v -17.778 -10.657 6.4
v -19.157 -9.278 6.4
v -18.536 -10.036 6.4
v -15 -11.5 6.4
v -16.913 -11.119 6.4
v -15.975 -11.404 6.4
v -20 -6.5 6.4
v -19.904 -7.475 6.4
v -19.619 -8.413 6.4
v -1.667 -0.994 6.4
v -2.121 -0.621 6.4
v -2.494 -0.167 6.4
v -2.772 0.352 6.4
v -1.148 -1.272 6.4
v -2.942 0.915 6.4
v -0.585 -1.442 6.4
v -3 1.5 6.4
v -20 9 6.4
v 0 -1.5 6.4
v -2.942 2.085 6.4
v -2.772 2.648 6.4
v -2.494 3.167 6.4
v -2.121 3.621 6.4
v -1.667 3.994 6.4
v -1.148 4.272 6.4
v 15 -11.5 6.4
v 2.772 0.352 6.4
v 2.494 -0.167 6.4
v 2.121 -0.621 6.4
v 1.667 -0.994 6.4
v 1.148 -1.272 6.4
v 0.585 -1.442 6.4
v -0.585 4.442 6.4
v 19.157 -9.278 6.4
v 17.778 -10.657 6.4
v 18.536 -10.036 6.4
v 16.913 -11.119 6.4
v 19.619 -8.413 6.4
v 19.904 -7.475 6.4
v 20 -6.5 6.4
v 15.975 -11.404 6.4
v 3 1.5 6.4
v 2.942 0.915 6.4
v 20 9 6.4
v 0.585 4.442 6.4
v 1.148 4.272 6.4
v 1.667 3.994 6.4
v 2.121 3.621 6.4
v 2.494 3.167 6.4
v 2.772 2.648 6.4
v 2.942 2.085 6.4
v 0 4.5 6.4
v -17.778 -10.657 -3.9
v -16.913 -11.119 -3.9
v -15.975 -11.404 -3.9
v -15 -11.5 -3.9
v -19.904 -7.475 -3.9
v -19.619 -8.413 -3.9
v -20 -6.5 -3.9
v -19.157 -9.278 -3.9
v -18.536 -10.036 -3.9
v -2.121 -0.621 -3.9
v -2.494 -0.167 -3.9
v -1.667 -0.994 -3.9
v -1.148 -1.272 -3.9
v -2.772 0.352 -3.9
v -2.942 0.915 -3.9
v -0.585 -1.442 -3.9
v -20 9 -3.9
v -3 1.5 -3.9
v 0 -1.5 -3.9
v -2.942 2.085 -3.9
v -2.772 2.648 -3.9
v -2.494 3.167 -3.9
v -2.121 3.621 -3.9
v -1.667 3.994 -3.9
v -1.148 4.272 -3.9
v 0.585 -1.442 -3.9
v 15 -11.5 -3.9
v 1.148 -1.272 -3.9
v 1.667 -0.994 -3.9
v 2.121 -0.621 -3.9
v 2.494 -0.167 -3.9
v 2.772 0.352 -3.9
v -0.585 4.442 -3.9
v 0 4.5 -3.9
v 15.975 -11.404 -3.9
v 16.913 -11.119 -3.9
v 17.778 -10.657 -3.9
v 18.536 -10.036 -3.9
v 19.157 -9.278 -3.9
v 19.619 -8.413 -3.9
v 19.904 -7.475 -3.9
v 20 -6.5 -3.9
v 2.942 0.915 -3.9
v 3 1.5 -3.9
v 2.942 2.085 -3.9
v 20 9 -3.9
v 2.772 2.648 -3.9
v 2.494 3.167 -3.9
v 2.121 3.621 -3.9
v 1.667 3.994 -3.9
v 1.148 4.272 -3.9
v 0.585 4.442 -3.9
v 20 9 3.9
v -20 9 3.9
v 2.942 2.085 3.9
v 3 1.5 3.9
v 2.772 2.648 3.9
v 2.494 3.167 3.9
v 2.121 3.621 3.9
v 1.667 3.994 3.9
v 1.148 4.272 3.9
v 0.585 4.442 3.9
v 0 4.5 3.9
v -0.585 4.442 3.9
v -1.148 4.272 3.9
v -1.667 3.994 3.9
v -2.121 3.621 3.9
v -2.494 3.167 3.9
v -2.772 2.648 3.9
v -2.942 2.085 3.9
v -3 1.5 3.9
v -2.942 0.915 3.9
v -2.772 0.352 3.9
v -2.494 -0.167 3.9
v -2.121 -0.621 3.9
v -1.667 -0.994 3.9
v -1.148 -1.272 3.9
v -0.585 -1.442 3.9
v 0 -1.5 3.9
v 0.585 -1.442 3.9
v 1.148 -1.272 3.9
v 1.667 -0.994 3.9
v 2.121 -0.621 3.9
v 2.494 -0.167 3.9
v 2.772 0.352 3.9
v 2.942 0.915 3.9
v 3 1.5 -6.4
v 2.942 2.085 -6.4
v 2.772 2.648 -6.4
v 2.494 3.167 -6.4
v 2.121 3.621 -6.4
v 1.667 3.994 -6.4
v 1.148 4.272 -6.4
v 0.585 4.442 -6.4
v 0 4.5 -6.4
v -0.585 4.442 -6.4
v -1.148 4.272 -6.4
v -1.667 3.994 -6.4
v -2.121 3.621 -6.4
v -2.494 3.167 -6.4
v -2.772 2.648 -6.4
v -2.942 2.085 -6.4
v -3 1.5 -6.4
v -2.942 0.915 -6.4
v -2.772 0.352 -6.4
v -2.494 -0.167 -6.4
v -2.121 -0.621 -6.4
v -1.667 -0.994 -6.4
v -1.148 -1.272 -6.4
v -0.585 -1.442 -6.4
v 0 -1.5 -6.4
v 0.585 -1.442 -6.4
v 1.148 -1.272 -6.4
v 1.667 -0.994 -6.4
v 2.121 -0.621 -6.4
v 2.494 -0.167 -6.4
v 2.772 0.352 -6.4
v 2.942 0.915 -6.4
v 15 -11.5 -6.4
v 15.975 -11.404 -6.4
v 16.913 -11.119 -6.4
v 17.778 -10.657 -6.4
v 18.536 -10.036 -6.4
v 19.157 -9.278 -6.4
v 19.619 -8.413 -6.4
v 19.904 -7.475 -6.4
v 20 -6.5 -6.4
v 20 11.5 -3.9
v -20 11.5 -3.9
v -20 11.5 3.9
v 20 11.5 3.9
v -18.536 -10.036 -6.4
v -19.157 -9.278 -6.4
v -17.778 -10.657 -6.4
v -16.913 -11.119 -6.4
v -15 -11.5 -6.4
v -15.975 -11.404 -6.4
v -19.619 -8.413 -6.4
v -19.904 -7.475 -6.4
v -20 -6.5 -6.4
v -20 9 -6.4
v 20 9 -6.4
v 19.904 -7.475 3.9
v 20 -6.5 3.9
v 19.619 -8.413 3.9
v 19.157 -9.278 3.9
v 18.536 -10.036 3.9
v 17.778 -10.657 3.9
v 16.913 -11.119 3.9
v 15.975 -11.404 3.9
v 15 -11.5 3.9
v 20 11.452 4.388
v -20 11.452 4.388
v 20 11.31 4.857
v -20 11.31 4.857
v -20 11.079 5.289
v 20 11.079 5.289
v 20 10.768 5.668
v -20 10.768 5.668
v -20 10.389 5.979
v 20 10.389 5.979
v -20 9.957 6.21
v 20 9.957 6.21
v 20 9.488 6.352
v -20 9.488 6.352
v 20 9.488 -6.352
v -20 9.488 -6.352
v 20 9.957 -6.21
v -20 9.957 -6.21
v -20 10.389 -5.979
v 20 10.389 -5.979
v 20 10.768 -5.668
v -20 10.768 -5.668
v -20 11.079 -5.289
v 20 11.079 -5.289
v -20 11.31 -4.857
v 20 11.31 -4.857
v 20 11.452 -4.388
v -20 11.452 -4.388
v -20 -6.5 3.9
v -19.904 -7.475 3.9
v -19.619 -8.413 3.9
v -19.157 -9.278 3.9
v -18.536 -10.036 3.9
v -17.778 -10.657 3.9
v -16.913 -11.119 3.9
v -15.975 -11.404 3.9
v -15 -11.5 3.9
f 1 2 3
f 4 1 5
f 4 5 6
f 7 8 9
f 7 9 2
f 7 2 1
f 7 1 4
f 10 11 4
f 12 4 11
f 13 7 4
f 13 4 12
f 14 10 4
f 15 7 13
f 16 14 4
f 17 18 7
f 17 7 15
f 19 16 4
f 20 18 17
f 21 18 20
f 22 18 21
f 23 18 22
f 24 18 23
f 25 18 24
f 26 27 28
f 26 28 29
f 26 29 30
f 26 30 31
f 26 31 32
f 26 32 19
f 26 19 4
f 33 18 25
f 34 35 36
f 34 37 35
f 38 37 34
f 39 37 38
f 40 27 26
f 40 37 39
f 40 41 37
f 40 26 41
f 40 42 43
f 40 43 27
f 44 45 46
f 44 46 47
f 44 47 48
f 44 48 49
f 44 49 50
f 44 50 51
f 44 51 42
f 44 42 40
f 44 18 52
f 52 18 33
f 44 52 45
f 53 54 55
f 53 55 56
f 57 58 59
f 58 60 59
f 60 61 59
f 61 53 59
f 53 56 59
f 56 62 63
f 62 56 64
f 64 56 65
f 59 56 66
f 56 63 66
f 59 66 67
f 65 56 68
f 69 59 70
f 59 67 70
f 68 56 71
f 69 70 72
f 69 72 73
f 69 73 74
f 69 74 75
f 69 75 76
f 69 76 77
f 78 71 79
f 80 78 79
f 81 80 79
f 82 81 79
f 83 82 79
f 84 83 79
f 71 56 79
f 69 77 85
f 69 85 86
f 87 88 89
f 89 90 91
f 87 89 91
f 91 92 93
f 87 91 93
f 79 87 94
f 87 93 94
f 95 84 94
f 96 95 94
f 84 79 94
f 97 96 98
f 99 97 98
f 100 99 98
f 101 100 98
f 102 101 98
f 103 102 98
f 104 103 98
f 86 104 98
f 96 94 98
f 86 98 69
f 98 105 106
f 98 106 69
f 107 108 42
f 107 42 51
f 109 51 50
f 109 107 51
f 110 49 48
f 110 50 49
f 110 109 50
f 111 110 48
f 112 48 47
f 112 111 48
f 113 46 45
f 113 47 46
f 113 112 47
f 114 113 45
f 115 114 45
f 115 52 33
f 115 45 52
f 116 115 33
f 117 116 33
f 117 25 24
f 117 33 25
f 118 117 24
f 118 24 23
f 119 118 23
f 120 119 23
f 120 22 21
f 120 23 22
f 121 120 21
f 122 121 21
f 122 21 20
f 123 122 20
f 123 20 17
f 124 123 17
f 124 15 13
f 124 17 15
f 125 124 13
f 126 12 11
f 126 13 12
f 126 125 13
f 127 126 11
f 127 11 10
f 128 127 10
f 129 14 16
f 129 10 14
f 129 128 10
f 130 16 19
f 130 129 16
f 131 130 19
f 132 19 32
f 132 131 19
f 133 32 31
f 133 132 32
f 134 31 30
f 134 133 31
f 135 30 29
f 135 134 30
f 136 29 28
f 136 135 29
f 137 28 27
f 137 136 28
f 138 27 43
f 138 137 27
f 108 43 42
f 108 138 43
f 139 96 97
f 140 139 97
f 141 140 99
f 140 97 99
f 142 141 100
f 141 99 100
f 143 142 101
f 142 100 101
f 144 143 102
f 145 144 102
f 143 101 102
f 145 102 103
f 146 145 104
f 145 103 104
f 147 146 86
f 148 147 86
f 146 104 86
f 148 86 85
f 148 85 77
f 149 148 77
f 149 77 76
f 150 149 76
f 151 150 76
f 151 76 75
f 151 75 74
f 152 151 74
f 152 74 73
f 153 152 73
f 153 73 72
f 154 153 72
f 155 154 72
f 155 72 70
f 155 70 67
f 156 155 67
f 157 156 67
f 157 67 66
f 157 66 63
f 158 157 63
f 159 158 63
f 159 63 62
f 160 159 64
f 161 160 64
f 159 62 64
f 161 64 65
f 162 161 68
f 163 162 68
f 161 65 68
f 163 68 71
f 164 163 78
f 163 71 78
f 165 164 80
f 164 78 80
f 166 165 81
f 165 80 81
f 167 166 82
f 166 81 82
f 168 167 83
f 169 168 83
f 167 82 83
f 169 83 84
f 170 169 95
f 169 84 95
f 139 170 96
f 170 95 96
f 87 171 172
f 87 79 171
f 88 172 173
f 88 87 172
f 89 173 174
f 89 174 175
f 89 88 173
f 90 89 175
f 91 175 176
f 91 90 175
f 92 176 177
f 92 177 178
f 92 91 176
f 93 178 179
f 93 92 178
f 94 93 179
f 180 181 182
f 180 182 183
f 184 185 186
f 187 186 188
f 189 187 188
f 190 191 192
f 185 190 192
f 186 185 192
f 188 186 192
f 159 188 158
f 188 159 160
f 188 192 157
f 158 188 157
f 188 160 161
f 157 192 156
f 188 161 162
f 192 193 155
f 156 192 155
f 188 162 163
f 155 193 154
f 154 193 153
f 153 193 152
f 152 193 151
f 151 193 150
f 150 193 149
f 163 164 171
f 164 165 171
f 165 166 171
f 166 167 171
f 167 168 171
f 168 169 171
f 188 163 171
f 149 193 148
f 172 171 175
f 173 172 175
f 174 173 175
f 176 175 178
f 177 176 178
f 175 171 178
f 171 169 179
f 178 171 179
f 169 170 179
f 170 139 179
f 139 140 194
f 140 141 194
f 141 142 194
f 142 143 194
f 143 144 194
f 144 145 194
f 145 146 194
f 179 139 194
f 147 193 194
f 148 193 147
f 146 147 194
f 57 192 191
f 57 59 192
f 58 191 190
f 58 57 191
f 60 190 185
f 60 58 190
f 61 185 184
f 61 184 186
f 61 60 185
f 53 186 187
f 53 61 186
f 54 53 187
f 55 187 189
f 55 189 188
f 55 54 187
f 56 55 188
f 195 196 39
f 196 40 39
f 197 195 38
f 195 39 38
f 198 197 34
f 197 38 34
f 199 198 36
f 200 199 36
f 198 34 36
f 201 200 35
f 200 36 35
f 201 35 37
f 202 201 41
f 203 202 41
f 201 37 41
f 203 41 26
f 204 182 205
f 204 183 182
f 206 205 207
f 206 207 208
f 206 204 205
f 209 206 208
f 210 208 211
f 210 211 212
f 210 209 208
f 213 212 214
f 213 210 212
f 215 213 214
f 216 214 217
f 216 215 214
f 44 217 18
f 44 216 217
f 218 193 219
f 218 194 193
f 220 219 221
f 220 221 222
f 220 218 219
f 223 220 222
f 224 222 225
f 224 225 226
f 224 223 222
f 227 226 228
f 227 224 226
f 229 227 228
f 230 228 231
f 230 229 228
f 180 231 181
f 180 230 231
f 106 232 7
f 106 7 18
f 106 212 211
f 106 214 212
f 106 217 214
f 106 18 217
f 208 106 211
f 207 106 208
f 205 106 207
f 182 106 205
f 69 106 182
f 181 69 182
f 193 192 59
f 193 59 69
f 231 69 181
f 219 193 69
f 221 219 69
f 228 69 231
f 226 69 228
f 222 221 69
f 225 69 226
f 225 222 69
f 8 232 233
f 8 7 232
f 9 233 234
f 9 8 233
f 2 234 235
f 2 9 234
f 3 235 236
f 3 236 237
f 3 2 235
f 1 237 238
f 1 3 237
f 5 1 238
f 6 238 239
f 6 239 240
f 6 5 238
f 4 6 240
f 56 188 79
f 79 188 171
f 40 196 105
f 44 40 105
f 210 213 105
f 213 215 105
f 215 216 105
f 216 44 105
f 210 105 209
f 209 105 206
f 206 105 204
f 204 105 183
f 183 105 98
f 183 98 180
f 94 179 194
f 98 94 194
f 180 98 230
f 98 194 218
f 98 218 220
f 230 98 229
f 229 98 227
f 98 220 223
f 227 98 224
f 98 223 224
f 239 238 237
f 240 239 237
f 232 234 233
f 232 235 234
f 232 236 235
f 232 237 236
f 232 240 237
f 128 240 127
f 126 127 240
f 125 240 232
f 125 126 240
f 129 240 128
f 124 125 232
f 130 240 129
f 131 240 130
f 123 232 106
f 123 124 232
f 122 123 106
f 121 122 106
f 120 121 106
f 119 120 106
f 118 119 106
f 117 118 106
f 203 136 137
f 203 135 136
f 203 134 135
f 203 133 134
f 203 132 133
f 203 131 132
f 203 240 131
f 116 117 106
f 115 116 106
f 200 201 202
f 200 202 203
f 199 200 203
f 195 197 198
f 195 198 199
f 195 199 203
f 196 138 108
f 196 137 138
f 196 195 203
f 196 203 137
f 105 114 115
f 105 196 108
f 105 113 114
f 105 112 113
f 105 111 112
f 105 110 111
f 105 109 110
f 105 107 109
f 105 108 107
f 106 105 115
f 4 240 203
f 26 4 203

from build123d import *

# Parameters (mm, degrees)
BOSS_EXTRUDE1_DEPTH            = 6.4
BOSS_EXTRUDE1_DEPTH_BACK       = 6.4
SKETCH1_W                      = 40
SKETCH1_H                      = 23
CUT_EXTRUDE1_REACH             = 25.942
SKETCH2_W                      = 7.8
SKETCH2_H                      = 20.5
CUT_EXTRUDE1_DIRECTION_2_REACH = 25.942
FILLET1_R                      = 5
FILLET2_R                      = 2.5
CUT_EXTRUDE2_REACH             = 25.942
SKETCH3_R                      = 3
CUT_EXTRUDE2_DIRECTION_2_REACH = 25.942


with BuildPart() as part:
    # Sketch1 → Boss-Extrude1 (new, two sides: drawn at the far end of the back side and taken through both)
    with BuildSketch(Plane.XY.offset(-BOSS_EXTRUDE1_DEPTH_BACK)):
        Rectangle(SKETCH1_W, SKETCH1_H)
    extrude(amount=BOSS_EXTRUDE1_DEPTH + BOSS_EXTRUDE1_DEPTH_BACK)

    # Cut-Extrude1: up to this face of the body (flat: up to its plane)
    cut_extrude1_end = Plane(part.part.faces().sort_by_distance((-20, 0, 0))[0])
    # Sketch2 → Cut-Extrude1 (cut, up to the picked face)
    with BuildSketch(Plane(origin=(0, 0, 0), x_dir=(0, 0, -1), z_dir=(1, 0, 0)), mode=Mode.PRIVATE) as cut_extrude1_sk1:
        with Locations((0, -1.25)):
            Rectangle(SKETCH2_W, SKETCH2_H)
    cut_extrude1_tool1 = split(extrude(cut_extrude1_sk1.sketch, amount=-CUT_EXTRUDE1_REACH, mode=Mode.PRIVATE), bisect_by=cut_extrude1_end, keep=Keep.BOTH, mode=Mode.PRIVATE)
    add(cut_extrude1_tool1.solids().sort_by(Axis((0, -1.25, 0), (-1, 0, 0)))[0], mode=Mode.SUBTRACT)

    # Cut-Extrude1 direction 2: up to this face of the body (flat: up to its plane)
    cut_extrude1_direction_2_end = Plane(part.part.faces().sort_by_distance((20, 0, 0))[0])
    # Sketch2 → Cut-Extrude1 direction 2 (cut, up to the picked face)
    with BuildSketch(Plane(origin=(0, 0, 0), x_dir=(0, 0, -1), z_dir=(1, 0, 0)), mode=Mode.PRIVATE) as cut_extrude1_direction_2_sk1:
        with Locations((0, -1.25)):
            Rectangle(SKETCH2_W, SKETCH2_H)
    cut_extrude1_direction_2_tool1 = split(extrude(cut_extrude1_direction_2_sk1.sketch, amount=CUT_EXTRUDE1_DIRECTION_2_REACH, mode=Mode.PRIVATE), bisect_by=cut_extrude1_direction_2_end, keep=Keep.BOTH, mode=Mode.PRIVATE)
    add(cut_extrude1_direction_2_tool1.solids().sort_by(Axis((0, -1.25, 0), (1, 0, 0)))[0], mode=Mode.SUBTRACT)

    # Fillet1
    fillet1_edges = [part.edges().sort_by_distance(p)[0] for p in [
        (-20, -11.5, 5.15),
        (20, -11.5, 5.15),
        (20, -11.5, -5.15),
        (-20, -11.5, -5.15),
    ]]
    fillet(fillet1_edges, radius=FILLET1_R)

    # Fillet2
    fillet2_edges = [part.edges().sort_by_distance(p)[0] for p in [
        (0, 11.5, 6.4),
        (0, 11.5, -6.4),
    ]]
    fillet(fillet2_edges, radius=FILLET2_R)

    # Cut-Extrude2: up to this face of the body (flat: up to its plane)
    cut_extrude2_end = Plane(part.part.faces().sort_by_distance((0, -1.128903629, -6.4))[0])
    # Sketch3 → Cut-Extrude2 (cut, up to the picked face)
    with BuildSketch(Plane.XY, mode=Mode.PRIVATE) as cut_extrude2_sk1:
        with Locations((0, 1.5)):
            Circle(SKETCH3_R)
    cut_extrude2_tool1 = split(extrude(cut_extrude2_sk1.sketch, amount=-CUT_EXTRUDE2_REACH, mode=Mode.PRIVATE), bisect_by=cut_extrude2_end, keep=Keep.BOTH, mode=Mode.PRIVATE)
    add(cut_extrude2_tool1.solids().sort_by(Axis((0, 1.5, 0), (0, 0, -1)))[0], mode=Mode.SUBTRACT)

    # Cut-Extrude2 direction 2: up to this face of the body (flat: up to its plane)
    cut_extrude2_direction_2_end = Plane(part.part.faces().sort_by_distance((0, -1.128903629, 6.4))[0])
    # Sketch3 → Cut-Extrude2 direction 2 (cut, up to the picked face)
    with BuildSketch(Plane.XY, mode=Mode.PRIVATE) as cut_extrude2_direction_2_sk1:
        with Locations((0, 1.5)):
            Circle(SKETCH3_R)
    cut_extrude2_direction_2_tool1 = split(extrude(cut_extrude2_direction_2_sk1.sketch, amount=CUT_EXTRUDE2_DIRECTION_2_REACH, mode=Mode.PRIVATE), bisect_by=cut_extrude2_direction_2_end, keep=Keep.BOTH, mode=Mode.PRIVATE)
    add(cut_extrude2_direction_2_tool1.solids().sort_by(Axis((0, 1.5, 0), (0, 0, 1)))[0], mode=Mode.SUBTRACT)


solid = part.part
